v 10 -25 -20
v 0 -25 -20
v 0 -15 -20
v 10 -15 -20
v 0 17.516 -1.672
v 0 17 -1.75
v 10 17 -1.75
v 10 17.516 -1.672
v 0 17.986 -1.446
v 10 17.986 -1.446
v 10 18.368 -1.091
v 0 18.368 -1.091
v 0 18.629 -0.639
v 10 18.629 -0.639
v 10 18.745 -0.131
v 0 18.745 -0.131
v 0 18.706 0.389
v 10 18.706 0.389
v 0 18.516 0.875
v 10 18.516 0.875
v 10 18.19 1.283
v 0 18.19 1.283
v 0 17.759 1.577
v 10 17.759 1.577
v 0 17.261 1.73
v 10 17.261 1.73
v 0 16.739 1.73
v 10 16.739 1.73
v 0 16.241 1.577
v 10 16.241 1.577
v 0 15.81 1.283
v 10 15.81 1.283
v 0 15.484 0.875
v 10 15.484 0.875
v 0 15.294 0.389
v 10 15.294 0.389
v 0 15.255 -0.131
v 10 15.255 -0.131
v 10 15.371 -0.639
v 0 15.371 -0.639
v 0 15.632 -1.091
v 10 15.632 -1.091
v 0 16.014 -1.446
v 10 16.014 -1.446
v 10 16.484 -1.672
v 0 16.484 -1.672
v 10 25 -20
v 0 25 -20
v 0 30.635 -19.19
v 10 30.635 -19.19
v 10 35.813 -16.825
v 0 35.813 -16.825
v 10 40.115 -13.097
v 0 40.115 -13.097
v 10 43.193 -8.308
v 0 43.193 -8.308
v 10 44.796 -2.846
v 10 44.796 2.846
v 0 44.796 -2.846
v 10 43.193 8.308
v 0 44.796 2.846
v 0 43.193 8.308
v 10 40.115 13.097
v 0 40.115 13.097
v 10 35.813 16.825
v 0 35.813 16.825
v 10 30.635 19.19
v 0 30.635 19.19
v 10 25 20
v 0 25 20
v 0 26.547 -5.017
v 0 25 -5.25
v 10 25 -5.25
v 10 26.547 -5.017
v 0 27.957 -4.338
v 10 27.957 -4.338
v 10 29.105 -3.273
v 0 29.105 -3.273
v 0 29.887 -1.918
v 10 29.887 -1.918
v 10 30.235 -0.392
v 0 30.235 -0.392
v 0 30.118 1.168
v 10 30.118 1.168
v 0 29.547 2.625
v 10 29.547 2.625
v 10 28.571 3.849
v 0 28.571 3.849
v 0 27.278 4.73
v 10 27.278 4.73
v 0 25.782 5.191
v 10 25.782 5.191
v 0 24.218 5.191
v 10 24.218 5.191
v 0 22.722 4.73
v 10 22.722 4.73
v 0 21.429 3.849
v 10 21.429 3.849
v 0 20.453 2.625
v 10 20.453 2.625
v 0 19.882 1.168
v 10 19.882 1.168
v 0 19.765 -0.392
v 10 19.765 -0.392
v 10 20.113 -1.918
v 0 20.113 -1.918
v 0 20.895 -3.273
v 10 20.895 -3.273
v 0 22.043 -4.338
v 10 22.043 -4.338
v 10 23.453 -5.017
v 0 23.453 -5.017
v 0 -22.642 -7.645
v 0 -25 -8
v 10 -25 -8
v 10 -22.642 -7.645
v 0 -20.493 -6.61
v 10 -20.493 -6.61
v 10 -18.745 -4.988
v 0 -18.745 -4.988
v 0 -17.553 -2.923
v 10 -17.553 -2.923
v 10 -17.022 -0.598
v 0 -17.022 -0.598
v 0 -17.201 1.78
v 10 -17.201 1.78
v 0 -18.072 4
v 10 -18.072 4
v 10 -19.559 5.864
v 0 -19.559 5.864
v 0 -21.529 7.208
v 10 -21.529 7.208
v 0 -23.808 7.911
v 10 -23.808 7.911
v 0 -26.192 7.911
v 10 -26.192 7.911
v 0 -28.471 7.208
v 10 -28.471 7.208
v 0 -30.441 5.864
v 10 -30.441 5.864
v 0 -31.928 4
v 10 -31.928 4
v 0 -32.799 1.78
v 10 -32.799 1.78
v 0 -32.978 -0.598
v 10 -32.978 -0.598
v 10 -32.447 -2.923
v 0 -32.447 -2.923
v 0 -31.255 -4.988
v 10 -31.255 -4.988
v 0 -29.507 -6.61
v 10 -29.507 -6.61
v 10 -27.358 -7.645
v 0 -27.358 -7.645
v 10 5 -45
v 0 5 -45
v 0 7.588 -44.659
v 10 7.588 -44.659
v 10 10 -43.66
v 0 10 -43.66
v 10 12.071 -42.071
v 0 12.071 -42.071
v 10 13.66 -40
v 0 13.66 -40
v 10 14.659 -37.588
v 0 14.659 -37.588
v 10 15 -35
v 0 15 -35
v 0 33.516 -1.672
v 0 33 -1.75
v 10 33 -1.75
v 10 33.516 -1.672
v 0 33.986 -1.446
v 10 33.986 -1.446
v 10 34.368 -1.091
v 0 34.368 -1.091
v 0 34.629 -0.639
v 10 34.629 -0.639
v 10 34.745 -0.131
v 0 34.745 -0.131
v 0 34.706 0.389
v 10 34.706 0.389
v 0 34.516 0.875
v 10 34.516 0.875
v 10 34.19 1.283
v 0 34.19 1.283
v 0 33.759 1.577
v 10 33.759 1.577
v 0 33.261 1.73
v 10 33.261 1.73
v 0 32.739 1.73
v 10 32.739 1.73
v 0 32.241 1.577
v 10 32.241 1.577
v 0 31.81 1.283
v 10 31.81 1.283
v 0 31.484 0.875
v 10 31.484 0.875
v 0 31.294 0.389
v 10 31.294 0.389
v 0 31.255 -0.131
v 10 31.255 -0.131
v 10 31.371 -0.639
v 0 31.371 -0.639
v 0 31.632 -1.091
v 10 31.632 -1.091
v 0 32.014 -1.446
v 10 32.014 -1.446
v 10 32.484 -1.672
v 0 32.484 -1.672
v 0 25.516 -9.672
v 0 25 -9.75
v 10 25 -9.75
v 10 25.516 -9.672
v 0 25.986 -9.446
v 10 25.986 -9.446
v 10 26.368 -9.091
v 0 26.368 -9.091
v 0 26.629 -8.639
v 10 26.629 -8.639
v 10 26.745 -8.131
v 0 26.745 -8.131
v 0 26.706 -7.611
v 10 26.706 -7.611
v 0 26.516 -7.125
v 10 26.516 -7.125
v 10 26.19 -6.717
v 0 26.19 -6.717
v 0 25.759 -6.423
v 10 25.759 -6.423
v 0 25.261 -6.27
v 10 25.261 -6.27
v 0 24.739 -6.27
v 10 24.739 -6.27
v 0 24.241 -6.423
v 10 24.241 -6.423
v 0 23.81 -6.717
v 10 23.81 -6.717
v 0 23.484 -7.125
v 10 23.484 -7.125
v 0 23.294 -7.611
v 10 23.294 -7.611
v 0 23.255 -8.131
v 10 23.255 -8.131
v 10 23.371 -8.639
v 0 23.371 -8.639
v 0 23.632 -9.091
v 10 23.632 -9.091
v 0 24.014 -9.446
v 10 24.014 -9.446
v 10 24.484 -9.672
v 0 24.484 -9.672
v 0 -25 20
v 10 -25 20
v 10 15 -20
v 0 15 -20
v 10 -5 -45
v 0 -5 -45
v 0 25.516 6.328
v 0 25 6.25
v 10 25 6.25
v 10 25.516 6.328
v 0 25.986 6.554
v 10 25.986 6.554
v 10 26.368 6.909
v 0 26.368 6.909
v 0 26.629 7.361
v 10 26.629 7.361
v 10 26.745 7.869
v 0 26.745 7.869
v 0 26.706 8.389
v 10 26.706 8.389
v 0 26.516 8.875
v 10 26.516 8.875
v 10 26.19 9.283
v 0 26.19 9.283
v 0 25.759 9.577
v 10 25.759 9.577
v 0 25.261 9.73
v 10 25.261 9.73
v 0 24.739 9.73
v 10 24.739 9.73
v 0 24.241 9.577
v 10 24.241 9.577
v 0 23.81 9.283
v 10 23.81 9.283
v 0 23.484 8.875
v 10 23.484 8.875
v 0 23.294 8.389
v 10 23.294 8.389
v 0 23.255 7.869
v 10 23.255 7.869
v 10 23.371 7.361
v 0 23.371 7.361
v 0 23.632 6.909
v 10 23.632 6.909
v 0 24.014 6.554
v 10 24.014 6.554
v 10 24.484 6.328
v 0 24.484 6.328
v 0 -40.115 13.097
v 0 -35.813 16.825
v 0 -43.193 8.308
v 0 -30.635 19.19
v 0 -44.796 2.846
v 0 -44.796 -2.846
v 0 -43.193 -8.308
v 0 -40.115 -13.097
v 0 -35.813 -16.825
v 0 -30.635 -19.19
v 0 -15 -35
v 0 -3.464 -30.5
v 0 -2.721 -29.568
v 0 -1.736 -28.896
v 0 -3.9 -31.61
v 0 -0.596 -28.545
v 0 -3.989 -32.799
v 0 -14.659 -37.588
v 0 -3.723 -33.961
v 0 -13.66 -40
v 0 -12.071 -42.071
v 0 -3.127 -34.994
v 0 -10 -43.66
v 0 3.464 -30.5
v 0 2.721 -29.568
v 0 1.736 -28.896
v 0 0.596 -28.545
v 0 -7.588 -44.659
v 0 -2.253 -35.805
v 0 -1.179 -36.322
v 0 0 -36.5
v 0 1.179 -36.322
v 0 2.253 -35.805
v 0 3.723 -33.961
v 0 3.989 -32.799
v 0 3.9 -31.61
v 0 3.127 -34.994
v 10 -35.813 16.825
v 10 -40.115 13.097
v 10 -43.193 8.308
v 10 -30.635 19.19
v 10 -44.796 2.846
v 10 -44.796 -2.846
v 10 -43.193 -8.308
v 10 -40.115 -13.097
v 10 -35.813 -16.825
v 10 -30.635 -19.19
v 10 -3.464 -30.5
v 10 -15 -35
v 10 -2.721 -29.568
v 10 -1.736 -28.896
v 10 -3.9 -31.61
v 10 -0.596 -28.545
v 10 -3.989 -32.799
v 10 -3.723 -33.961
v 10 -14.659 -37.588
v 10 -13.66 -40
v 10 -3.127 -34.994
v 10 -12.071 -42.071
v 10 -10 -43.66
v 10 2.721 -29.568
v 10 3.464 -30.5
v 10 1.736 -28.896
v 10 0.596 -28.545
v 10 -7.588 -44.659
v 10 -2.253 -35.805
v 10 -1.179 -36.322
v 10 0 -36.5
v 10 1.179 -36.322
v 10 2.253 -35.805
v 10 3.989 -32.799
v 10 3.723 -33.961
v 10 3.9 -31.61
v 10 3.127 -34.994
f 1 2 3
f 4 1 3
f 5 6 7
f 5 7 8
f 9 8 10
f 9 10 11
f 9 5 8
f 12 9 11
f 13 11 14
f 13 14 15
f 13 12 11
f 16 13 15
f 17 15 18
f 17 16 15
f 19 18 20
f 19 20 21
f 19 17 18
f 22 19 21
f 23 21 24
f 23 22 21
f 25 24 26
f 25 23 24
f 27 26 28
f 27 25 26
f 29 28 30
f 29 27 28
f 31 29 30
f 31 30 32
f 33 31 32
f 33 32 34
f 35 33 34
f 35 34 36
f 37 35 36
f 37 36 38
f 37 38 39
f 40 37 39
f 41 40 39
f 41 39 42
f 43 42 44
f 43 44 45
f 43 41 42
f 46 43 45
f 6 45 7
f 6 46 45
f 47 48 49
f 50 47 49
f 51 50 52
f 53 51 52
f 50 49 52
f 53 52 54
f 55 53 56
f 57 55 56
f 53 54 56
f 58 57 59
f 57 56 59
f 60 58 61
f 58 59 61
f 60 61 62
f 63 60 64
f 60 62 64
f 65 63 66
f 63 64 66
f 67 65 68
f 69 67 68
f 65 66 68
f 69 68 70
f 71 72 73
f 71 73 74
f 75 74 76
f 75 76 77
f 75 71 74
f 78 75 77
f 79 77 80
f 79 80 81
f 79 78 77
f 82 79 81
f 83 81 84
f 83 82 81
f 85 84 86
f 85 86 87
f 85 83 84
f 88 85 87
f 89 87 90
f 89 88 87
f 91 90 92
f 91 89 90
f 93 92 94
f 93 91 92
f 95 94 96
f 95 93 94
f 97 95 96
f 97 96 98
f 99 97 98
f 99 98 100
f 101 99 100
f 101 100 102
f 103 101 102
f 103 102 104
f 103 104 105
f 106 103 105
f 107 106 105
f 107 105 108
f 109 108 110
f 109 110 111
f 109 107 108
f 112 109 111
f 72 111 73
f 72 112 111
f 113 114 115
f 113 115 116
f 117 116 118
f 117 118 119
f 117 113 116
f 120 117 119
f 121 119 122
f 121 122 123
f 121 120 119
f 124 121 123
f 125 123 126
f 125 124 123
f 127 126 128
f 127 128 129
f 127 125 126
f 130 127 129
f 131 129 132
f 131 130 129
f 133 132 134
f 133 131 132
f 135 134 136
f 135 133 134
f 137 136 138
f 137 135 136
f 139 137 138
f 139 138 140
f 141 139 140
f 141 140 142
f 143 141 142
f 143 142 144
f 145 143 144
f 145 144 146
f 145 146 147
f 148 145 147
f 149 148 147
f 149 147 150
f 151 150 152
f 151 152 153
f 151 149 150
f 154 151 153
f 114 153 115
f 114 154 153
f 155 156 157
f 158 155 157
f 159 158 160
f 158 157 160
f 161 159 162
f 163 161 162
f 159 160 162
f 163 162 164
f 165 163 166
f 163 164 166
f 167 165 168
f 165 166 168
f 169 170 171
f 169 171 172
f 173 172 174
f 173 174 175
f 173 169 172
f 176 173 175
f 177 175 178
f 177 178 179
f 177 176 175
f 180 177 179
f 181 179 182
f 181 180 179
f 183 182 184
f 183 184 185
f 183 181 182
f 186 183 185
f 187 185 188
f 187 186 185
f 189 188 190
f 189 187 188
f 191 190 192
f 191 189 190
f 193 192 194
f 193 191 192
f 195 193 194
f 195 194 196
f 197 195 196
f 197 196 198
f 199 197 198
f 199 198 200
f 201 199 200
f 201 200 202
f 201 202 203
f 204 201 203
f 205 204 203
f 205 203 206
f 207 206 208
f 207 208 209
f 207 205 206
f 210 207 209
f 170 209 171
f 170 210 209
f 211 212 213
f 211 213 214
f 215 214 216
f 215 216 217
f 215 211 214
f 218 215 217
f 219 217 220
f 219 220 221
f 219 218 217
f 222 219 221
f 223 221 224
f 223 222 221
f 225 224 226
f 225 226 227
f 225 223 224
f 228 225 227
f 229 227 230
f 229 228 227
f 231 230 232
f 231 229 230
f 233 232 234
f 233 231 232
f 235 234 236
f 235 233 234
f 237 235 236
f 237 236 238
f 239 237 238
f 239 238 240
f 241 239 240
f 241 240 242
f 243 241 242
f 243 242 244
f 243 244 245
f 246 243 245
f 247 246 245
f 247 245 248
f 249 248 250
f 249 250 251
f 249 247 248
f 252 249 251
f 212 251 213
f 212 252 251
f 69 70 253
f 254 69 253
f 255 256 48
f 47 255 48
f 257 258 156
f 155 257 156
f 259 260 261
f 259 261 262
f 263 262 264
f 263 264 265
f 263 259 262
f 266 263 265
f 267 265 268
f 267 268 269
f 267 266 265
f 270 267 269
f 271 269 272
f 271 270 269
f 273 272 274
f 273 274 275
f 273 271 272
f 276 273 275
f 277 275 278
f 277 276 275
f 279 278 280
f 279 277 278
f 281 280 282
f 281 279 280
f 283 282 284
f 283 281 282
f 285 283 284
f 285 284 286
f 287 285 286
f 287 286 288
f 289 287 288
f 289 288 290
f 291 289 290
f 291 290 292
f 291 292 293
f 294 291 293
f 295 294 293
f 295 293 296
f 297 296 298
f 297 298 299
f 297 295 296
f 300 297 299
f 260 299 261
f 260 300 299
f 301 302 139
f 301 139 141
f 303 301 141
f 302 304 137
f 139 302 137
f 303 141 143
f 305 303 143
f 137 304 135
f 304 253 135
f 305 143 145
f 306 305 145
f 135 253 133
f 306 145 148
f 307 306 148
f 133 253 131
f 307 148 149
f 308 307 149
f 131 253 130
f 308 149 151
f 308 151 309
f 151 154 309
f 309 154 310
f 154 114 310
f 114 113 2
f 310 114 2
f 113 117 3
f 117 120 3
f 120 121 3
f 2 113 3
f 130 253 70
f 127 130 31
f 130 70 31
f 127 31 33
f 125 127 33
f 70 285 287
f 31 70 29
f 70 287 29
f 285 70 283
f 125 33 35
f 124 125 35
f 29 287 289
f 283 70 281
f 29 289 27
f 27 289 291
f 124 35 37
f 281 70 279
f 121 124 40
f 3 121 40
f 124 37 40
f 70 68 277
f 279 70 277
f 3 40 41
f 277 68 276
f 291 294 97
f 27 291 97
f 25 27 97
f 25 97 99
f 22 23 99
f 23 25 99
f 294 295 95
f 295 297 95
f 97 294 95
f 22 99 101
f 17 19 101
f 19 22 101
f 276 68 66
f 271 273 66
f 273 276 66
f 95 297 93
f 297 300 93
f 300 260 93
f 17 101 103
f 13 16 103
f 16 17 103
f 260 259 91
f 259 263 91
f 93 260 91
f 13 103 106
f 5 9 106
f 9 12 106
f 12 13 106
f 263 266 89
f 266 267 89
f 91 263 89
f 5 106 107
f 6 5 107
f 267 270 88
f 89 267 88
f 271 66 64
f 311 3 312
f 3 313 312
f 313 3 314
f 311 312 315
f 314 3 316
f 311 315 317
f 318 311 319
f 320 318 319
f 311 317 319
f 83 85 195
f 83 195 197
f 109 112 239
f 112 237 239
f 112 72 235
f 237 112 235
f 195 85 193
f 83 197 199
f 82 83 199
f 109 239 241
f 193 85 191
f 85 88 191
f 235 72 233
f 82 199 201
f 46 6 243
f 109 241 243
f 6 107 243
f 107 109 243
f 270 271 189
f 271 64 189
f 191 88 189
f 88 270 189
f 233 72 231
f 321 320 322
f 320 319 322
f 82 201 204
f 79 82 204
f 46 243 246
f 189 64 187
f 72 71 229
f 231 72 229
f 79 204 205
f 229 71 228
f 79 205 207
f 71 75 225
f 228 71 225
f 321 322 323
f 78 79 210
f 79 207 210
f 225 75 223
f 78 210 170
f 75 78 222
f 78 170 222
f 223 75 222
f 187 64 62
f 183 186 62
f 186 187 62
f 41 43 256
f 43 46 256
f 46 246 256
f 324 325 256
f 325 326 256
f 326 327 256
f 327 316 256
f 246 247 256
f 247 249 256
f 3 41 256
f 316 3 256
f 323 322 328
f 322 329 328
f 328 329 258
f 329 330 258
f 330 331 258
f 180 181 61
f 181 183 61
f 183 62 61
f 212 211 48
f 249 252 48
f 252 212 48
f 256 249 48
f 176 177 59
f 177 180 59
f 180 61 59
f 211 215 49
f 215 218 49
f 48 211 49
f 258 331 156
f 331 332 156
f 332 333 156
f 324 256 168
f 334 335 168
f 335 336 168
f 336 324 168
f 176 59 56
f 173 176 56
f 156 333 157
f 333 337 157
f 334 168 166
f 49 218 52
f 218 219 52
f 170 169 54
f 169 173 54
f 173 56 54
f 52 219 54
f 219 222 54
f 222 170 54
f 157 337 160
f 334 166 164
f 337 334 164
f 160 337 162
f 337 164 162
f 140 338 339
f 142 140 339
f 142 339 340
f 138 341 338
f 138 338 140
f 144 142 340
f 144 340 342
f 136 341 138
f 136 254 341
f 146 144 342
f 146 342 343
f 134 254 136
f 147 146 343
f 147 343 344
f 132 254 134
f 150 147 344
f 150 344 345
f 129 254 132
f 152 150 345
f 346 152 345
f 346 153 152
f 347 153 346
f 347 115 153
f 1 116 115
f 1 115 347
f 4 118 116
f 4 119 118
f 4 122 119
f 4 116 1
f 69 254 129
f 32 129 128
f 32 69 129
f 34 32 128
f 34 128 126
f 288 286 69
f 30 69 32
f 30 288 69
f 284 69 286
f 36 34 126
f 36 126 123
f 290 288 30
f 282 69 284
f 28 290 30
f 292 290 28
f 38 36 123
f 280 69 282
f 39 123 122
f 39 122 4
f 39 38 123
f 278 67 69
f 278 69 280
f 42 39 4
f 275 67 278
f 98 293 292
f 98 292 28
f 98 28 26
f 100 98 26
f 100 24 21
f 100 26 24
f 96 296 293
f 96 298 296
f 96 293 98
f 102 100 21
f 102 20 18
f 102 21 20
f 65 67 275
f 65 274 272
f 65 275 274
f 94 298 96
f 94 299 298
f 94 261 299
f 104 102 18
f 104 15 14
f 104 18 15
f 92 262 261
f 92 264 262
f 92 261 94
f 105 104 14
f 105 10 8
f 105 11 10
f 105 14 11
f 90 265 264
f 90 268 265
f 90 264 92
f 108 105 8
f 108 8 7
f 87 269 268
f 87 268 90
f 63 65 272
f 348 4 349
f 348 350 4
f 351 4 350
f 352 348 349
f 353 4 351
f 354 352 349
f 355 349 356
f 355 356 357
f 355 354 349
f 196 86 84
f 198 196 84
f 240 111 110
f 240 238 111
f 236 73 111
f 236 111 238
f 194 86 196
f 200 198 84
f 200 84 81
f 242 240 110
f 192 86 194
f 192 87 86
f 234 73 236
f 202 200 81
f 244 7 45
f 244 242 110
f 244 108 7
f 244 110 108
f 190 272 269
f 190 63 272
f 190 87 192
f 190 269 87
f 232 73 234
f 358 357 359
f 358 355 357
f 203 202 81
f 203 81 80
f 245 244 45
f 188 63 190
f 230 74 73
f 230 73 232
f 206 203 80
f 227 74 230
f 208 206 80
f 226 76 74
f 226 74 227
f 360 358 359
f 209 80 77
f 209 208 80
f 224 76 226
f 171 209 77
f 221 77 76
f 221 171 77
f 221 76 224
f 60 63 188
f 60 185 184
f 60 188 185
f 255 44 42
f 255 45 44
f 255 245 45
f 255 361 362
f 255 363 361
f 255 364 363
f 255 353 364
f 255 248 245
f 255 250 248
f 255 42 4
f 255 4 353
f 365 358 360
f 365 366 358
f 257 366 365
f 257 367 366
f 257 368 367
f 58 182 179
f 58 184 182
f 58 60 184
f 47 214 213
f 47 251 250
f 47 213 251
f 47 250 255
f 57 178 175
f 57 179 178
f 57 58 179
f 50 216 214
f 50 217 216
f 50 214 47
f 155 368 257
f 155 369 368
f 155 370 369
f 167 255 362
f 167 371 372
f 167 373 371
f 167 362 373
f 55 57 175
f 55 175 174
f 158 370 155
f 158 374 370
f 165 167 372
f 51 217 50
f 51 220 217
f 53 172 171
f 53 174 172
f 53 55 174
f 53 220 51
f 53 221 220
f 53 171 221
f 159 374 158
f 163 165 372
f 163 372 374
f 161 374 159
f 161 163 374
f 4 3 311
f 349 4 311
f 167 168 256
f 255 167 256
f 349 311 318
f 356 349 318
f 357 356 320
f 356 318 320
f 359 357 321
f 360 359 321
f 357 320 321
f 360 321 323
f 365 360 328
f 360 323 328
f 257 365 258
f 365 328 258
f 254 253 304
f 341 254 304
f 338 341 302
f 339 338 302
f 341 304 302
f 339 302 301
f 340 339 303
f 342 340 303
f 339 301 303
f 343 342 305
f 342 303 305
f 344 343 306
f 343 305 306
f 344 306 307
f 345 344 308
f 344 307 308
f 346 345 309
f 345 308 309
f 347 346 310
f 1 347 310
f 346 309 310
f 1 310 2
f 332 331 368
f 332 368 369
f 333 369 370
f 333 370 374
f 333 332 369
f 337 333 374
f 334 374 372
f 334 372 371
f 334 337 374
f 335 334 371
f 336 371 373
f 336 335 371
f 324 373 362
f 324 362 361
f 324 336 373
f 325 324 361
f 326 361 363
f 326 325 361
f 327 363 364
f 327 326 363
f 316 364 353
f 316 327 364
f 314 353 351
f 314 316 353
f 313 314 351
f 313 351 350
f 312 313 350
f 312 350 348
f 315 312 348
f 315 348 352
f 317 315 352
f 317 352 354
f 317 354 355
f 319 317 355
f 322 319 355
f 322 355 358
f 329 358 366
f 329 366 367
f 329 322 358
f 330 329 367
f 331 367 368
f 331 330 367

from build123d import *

# Parameters (mm, degrees)
CROQUIS1_R              = 5.25
CROQUIS1_R_2            = 8
CROQUIS1_R_3            = 1.75
CROQUIS1_R_4            = 4
SALIENTE_EXTRUIR1_DEPTH = 10


with BuildPart() as part:
    # Croquis1 → Saliente-Extruir1 (new body)
    with BuildSketch(Plane(origin=(0, 0, 0), x_dir=(0, 0, -1), z_dir=(1, 0, 0))):
        with BuildLine():
            Line((20, 15), (20, 25))
            ThreePointArc((20, 25), (0, 45), (-20, 25))
            Line((-20, 25), (-20, -25))
            ThreePointArc((-20, -25), (0, -45), (20, -25))
            Line((20, -25), (20, -15))
            Line((20, -15), (35, -15))
            ThreePointArc((35, -15), (42.071067812, -12.071067812), (45, -5))
            Line((45, -5), (45, 5))
            ThreePointArc((45, 5), (42.071067812, 12.071067812), (35, 15))
            Line((35, 15), (20, 15))
        make_face()
        with Locations((0, 25)):
            Circle(CROQUIS1_R, mode=Mode.SUBTRACT)
        with Locations((0, -25)):
            Circle(CROQUIS1_R_2, mode=Mode.SUBTRACT)
        with Locations((0, 33)):
            Circle(CROQUIS1_R_3, mode=Mode.SUBTRACT)
        with Locations((8, 25)):
            Circle(CROQUIS1_R_3, mode=Mode.SUBTRACT)
        with Locations((0, 17)):
            Circle(CROQUIS1_R_3, mode=Mode.SUBTRACT)
        with Locations((-8, 25)):
            Circle(CROQUIS1_R_3, mode=Mode.SUBTRACT)
        with Locations((32.5, 0)):
            Circle(CROQUIS1_R_4, mode=Mode.SUBTRACT)
    extrude(amount=SALIENTE_EXTRUIR1_DEPTH)


solid = part.part
